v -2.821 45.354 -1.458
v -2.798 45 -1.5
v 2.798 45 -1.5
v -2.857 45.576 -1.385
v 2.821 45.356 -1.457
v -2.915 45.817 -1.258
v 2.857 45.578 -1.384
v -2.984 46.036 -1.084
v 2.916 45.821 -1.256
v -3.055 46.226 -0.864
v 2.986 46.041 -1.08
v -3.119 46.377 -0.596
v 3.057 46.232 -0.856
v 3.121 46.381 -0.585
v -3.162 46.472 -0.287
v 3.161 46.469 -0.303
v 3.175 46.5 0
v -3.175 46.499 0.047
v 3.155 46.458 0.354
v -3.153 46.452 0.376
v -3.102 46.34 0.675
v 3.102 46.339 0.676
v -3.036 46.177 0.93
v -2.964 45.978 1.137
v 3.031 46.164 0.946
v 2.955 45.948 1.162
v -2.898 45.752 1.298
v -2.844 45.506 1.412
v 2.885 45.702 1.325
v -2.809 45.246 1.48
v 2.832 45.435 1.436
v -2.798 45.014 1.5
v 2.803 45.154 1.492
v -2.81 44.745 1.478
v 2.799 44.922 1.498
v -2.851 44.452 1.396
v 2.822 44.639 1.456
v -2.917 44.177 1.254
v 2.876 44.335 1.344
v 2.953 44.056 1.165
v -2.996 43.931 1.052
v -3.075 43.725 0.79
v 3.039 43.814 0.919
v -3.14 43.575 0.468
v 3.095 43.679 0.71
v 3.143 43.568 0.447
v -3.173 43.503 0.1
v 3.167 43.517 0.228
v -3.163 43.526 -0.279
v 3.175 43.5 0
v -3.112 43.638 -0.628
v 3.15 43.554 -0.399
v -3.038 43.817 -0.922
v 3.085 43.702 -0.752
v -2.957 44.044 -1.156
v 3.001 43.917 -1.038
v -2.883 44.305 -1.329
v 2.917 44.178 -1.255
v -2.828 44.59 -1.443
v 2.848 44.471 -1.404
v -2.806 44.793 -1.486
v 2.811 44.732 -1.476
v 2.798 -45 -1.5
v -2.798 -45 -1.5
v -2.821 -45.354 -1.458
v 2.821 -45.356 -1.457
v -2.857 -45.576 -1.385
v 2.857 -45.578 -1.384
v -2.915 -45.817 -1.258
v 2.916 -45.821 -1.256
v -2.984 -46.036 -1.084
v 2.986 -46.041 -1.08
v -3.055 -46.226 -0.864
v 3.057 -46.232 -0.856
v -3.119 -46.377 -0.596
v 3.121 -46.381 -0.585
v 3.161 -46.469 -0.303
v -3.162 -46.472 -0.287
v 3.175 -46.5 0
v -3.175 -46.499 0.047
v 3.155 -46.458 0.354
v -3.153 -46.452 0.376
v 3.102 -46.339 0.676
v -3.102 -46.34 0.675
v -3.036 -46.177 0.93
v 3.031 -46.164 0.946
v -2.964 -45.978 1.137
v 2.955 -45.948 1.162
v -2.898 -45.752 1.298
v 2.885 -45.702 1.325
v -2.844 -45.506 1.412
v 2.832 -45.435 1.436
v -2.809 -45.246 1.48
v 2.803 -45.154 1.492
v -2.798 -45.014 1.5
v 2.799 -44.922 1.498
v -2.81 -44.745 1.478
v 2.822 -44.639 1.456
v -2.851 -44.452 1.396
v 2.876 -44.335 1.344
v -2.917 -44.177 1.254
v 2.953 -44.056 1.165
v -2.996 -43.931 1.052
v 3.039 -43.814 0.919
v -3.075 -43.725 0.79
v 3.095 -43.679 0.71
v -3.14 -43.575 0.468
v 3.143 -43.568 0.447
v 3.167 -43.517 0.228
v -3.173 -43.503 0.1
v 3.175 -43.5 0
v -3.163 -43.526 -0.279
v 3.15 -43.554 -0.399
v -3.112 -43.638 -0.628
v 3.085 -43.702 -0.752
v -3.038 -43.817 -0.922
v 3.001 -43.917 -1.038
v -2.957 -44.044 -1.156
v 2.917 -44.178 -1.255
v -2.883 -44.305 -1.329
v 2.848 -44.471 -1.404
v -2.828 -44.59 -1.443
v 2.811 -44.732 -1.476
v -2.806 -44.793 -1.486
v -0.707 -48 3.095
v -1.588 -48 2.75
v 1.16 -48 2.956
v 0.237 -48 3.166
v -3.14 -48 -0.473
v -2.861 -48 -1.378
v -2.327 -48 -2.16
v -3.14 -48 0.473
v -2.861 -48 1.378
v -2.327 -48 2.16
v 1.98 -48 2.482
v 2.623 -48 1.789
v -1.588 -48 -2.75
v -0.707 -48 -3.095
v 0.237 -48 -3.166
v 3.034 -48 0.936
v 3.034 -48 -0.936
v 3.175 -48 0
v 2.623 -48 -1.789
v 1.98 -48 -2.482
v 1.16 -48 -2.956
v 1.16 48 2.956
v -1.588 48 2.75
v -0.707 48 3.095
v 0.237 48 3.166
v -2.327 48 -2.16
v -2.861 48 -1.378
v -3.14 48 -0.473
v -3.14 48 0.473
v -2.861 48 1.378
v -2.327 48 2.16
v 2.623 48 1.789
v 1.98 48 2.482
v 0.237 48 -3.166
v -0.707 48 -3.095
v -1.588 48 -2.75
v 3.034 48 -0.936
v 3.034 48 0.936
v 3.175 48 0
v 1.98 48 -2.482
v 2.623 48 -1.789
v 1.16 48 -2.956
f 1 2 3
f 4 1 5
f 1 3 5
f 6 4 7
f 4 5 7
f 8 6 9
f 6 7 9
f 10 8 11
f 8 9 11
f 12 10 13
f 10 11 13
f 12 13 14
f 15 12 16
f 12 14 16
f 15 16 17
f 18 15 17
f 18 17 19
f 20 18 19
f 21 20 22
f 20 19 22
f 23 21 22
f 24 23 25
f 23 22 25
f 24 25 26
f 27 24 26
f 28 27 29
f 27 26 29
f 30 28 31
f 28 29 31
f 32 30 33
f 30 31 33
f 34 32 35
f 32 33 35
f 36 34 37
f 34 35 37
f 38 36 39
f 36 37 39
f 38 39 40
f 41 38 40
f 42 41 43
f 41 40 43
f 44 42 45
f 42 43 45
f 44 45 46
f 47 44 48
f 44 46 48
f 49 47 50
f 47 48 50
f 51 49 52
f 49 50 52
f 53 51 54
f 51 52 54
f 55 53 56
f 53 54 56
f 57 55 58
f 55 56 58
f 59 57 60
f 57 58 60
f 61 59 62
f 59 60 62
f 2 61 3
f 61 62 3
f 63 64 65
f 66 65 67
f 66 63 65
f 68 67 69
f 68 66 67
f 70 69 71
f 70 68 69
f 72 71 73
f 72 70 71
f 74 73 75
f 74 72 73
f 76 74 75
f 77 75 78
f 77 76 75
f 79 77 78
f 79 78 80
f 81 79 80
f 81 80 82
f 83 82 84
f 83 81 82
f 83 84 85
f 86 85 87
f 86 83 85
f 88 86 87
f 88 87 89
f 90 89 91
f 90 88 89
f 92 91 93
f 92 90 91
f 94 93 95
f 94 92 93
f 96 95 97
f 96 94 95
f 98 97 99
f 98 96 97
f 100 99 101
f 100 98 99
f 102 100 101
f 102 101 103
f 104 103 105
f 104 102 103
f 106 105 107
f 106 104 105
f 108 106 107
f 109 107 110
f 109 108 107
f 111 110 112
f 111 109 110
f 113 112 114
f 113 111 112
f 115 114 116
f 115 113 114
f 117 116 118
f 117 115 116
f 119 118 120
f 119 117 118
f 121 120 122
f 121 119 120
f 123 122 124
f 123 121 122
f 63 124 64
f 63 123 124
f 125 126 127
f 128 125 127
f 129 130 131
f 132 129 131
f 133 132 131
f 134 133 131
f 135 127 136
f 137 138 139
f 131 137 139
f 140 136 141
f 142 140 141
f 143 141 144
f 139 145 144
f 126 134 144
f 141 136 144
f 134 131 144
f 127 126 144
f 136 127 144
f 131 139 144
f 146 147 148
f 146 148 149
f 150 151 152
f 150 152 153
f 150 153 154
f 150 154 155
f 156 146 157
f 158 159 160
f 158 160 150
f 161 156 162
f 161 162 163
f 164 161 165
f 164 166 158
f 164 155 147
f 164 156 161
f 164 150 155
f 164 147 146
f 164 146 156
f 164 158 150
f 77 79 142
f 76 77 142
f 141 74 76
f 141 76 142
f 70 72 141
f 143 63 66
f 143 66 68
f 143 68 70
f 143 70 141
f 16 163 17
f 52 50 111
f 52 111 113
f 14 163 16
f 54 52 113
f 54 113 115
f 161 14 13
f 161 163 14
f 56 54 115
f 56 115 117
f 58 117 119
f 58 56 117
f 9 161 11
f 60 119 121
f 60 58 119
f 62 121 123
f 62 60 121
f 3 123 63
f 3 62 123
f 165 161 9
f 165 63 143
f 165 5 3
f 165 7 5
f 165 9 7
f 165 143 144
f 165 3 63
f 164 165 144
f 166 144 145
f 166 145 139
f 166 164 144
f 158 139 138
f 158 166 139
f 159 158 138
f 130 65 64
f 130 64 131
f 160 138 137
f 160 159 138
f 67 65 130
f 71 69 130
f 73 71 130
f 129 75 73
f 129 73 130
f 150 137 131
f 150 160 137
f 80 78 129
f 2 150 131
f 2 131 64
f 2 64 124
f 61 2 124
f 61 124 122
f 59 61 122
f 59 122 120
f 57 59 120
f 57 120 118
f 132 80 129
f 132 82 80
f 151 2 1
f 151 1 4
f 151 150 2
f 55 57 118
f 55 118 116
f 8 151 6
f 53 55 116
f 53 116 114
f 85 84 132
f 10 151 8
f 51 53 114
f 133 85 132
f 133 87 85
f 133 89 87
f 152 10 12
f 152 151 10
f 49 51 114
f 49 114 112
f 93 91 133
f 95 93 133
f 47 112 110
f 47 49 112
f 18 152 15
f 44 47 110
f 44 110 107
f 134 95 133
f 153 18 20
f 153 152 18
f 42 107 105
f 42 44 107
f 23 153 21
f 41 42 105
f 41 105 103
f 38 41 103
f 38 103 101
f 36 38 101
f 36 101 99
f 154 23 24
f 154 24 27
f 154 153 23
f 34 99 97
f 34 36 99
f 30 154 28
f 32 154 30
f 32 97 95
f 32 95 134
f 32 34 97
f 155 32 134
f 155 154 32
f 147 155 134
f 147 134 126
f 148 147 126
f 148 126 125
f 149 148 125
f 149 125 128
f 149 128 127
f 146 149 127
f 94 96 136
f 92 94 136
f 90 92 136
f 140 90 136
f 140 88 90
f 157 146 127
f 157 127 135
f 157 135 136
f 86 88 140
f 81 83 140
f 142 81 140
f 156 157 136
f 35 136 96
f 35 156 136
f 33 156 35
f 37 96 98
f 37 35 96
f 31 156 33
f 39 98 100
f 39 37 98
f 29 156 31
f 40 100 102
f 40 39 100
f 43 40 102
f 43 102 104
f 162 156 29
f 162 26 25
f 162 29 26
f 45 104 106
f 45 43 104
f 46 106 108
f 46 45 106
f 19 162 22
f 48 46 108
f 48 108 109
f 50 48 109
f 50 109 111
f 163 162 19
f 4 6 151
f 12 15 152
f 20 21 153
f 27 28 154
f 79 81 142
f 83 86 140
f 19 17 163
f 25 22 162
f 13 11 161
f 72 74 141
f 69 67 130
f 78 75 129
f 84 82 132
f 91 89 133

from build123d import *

# Parameters (mm, degrees)
CROQUIS1_R              = 3.175
SALIENTE_EXTRUIR1_DEPTH = 48
CROQUIS2_R              = 1.5
CORTAR_EXTRUIR1_DEPTH   = 4.175


with BuildPart() as part:
    # Croquis1 → Saliente-Extruir1 (new body, symmetric)
    with BuildSketch(Plane(origin=(0, 0, 0), x_dir=(1, 0, 0), z_dir=(0, 1, 0))):
        Circle(CROQUIS1_R)
    extrude(amount=SALIENTE_EXTRUIR1_DEPTH, both=True)

    # Croquis2 → Cortar-Extruir1 (cut, symmetric)
    with BuildSketch(Plane(origin=(0, 0, 0), x_dir=(0, 0, -1), z_dir=(1, 0, 0))):
        with Locations((0, 45)):
            Circle(CROQUIS2_R)
    cortar_extruir1 = extrude(amount=CORTAR_EXTRUIR1_DEPTH, both=True, mode=Mode.SUBTRACT)

    # Simetría3: Cortar-Extruir1 across plane
    add(cortar_extruir1.mirror(Plane.ZX), mode=Mode.SUBTRACT)


solid = part.part
